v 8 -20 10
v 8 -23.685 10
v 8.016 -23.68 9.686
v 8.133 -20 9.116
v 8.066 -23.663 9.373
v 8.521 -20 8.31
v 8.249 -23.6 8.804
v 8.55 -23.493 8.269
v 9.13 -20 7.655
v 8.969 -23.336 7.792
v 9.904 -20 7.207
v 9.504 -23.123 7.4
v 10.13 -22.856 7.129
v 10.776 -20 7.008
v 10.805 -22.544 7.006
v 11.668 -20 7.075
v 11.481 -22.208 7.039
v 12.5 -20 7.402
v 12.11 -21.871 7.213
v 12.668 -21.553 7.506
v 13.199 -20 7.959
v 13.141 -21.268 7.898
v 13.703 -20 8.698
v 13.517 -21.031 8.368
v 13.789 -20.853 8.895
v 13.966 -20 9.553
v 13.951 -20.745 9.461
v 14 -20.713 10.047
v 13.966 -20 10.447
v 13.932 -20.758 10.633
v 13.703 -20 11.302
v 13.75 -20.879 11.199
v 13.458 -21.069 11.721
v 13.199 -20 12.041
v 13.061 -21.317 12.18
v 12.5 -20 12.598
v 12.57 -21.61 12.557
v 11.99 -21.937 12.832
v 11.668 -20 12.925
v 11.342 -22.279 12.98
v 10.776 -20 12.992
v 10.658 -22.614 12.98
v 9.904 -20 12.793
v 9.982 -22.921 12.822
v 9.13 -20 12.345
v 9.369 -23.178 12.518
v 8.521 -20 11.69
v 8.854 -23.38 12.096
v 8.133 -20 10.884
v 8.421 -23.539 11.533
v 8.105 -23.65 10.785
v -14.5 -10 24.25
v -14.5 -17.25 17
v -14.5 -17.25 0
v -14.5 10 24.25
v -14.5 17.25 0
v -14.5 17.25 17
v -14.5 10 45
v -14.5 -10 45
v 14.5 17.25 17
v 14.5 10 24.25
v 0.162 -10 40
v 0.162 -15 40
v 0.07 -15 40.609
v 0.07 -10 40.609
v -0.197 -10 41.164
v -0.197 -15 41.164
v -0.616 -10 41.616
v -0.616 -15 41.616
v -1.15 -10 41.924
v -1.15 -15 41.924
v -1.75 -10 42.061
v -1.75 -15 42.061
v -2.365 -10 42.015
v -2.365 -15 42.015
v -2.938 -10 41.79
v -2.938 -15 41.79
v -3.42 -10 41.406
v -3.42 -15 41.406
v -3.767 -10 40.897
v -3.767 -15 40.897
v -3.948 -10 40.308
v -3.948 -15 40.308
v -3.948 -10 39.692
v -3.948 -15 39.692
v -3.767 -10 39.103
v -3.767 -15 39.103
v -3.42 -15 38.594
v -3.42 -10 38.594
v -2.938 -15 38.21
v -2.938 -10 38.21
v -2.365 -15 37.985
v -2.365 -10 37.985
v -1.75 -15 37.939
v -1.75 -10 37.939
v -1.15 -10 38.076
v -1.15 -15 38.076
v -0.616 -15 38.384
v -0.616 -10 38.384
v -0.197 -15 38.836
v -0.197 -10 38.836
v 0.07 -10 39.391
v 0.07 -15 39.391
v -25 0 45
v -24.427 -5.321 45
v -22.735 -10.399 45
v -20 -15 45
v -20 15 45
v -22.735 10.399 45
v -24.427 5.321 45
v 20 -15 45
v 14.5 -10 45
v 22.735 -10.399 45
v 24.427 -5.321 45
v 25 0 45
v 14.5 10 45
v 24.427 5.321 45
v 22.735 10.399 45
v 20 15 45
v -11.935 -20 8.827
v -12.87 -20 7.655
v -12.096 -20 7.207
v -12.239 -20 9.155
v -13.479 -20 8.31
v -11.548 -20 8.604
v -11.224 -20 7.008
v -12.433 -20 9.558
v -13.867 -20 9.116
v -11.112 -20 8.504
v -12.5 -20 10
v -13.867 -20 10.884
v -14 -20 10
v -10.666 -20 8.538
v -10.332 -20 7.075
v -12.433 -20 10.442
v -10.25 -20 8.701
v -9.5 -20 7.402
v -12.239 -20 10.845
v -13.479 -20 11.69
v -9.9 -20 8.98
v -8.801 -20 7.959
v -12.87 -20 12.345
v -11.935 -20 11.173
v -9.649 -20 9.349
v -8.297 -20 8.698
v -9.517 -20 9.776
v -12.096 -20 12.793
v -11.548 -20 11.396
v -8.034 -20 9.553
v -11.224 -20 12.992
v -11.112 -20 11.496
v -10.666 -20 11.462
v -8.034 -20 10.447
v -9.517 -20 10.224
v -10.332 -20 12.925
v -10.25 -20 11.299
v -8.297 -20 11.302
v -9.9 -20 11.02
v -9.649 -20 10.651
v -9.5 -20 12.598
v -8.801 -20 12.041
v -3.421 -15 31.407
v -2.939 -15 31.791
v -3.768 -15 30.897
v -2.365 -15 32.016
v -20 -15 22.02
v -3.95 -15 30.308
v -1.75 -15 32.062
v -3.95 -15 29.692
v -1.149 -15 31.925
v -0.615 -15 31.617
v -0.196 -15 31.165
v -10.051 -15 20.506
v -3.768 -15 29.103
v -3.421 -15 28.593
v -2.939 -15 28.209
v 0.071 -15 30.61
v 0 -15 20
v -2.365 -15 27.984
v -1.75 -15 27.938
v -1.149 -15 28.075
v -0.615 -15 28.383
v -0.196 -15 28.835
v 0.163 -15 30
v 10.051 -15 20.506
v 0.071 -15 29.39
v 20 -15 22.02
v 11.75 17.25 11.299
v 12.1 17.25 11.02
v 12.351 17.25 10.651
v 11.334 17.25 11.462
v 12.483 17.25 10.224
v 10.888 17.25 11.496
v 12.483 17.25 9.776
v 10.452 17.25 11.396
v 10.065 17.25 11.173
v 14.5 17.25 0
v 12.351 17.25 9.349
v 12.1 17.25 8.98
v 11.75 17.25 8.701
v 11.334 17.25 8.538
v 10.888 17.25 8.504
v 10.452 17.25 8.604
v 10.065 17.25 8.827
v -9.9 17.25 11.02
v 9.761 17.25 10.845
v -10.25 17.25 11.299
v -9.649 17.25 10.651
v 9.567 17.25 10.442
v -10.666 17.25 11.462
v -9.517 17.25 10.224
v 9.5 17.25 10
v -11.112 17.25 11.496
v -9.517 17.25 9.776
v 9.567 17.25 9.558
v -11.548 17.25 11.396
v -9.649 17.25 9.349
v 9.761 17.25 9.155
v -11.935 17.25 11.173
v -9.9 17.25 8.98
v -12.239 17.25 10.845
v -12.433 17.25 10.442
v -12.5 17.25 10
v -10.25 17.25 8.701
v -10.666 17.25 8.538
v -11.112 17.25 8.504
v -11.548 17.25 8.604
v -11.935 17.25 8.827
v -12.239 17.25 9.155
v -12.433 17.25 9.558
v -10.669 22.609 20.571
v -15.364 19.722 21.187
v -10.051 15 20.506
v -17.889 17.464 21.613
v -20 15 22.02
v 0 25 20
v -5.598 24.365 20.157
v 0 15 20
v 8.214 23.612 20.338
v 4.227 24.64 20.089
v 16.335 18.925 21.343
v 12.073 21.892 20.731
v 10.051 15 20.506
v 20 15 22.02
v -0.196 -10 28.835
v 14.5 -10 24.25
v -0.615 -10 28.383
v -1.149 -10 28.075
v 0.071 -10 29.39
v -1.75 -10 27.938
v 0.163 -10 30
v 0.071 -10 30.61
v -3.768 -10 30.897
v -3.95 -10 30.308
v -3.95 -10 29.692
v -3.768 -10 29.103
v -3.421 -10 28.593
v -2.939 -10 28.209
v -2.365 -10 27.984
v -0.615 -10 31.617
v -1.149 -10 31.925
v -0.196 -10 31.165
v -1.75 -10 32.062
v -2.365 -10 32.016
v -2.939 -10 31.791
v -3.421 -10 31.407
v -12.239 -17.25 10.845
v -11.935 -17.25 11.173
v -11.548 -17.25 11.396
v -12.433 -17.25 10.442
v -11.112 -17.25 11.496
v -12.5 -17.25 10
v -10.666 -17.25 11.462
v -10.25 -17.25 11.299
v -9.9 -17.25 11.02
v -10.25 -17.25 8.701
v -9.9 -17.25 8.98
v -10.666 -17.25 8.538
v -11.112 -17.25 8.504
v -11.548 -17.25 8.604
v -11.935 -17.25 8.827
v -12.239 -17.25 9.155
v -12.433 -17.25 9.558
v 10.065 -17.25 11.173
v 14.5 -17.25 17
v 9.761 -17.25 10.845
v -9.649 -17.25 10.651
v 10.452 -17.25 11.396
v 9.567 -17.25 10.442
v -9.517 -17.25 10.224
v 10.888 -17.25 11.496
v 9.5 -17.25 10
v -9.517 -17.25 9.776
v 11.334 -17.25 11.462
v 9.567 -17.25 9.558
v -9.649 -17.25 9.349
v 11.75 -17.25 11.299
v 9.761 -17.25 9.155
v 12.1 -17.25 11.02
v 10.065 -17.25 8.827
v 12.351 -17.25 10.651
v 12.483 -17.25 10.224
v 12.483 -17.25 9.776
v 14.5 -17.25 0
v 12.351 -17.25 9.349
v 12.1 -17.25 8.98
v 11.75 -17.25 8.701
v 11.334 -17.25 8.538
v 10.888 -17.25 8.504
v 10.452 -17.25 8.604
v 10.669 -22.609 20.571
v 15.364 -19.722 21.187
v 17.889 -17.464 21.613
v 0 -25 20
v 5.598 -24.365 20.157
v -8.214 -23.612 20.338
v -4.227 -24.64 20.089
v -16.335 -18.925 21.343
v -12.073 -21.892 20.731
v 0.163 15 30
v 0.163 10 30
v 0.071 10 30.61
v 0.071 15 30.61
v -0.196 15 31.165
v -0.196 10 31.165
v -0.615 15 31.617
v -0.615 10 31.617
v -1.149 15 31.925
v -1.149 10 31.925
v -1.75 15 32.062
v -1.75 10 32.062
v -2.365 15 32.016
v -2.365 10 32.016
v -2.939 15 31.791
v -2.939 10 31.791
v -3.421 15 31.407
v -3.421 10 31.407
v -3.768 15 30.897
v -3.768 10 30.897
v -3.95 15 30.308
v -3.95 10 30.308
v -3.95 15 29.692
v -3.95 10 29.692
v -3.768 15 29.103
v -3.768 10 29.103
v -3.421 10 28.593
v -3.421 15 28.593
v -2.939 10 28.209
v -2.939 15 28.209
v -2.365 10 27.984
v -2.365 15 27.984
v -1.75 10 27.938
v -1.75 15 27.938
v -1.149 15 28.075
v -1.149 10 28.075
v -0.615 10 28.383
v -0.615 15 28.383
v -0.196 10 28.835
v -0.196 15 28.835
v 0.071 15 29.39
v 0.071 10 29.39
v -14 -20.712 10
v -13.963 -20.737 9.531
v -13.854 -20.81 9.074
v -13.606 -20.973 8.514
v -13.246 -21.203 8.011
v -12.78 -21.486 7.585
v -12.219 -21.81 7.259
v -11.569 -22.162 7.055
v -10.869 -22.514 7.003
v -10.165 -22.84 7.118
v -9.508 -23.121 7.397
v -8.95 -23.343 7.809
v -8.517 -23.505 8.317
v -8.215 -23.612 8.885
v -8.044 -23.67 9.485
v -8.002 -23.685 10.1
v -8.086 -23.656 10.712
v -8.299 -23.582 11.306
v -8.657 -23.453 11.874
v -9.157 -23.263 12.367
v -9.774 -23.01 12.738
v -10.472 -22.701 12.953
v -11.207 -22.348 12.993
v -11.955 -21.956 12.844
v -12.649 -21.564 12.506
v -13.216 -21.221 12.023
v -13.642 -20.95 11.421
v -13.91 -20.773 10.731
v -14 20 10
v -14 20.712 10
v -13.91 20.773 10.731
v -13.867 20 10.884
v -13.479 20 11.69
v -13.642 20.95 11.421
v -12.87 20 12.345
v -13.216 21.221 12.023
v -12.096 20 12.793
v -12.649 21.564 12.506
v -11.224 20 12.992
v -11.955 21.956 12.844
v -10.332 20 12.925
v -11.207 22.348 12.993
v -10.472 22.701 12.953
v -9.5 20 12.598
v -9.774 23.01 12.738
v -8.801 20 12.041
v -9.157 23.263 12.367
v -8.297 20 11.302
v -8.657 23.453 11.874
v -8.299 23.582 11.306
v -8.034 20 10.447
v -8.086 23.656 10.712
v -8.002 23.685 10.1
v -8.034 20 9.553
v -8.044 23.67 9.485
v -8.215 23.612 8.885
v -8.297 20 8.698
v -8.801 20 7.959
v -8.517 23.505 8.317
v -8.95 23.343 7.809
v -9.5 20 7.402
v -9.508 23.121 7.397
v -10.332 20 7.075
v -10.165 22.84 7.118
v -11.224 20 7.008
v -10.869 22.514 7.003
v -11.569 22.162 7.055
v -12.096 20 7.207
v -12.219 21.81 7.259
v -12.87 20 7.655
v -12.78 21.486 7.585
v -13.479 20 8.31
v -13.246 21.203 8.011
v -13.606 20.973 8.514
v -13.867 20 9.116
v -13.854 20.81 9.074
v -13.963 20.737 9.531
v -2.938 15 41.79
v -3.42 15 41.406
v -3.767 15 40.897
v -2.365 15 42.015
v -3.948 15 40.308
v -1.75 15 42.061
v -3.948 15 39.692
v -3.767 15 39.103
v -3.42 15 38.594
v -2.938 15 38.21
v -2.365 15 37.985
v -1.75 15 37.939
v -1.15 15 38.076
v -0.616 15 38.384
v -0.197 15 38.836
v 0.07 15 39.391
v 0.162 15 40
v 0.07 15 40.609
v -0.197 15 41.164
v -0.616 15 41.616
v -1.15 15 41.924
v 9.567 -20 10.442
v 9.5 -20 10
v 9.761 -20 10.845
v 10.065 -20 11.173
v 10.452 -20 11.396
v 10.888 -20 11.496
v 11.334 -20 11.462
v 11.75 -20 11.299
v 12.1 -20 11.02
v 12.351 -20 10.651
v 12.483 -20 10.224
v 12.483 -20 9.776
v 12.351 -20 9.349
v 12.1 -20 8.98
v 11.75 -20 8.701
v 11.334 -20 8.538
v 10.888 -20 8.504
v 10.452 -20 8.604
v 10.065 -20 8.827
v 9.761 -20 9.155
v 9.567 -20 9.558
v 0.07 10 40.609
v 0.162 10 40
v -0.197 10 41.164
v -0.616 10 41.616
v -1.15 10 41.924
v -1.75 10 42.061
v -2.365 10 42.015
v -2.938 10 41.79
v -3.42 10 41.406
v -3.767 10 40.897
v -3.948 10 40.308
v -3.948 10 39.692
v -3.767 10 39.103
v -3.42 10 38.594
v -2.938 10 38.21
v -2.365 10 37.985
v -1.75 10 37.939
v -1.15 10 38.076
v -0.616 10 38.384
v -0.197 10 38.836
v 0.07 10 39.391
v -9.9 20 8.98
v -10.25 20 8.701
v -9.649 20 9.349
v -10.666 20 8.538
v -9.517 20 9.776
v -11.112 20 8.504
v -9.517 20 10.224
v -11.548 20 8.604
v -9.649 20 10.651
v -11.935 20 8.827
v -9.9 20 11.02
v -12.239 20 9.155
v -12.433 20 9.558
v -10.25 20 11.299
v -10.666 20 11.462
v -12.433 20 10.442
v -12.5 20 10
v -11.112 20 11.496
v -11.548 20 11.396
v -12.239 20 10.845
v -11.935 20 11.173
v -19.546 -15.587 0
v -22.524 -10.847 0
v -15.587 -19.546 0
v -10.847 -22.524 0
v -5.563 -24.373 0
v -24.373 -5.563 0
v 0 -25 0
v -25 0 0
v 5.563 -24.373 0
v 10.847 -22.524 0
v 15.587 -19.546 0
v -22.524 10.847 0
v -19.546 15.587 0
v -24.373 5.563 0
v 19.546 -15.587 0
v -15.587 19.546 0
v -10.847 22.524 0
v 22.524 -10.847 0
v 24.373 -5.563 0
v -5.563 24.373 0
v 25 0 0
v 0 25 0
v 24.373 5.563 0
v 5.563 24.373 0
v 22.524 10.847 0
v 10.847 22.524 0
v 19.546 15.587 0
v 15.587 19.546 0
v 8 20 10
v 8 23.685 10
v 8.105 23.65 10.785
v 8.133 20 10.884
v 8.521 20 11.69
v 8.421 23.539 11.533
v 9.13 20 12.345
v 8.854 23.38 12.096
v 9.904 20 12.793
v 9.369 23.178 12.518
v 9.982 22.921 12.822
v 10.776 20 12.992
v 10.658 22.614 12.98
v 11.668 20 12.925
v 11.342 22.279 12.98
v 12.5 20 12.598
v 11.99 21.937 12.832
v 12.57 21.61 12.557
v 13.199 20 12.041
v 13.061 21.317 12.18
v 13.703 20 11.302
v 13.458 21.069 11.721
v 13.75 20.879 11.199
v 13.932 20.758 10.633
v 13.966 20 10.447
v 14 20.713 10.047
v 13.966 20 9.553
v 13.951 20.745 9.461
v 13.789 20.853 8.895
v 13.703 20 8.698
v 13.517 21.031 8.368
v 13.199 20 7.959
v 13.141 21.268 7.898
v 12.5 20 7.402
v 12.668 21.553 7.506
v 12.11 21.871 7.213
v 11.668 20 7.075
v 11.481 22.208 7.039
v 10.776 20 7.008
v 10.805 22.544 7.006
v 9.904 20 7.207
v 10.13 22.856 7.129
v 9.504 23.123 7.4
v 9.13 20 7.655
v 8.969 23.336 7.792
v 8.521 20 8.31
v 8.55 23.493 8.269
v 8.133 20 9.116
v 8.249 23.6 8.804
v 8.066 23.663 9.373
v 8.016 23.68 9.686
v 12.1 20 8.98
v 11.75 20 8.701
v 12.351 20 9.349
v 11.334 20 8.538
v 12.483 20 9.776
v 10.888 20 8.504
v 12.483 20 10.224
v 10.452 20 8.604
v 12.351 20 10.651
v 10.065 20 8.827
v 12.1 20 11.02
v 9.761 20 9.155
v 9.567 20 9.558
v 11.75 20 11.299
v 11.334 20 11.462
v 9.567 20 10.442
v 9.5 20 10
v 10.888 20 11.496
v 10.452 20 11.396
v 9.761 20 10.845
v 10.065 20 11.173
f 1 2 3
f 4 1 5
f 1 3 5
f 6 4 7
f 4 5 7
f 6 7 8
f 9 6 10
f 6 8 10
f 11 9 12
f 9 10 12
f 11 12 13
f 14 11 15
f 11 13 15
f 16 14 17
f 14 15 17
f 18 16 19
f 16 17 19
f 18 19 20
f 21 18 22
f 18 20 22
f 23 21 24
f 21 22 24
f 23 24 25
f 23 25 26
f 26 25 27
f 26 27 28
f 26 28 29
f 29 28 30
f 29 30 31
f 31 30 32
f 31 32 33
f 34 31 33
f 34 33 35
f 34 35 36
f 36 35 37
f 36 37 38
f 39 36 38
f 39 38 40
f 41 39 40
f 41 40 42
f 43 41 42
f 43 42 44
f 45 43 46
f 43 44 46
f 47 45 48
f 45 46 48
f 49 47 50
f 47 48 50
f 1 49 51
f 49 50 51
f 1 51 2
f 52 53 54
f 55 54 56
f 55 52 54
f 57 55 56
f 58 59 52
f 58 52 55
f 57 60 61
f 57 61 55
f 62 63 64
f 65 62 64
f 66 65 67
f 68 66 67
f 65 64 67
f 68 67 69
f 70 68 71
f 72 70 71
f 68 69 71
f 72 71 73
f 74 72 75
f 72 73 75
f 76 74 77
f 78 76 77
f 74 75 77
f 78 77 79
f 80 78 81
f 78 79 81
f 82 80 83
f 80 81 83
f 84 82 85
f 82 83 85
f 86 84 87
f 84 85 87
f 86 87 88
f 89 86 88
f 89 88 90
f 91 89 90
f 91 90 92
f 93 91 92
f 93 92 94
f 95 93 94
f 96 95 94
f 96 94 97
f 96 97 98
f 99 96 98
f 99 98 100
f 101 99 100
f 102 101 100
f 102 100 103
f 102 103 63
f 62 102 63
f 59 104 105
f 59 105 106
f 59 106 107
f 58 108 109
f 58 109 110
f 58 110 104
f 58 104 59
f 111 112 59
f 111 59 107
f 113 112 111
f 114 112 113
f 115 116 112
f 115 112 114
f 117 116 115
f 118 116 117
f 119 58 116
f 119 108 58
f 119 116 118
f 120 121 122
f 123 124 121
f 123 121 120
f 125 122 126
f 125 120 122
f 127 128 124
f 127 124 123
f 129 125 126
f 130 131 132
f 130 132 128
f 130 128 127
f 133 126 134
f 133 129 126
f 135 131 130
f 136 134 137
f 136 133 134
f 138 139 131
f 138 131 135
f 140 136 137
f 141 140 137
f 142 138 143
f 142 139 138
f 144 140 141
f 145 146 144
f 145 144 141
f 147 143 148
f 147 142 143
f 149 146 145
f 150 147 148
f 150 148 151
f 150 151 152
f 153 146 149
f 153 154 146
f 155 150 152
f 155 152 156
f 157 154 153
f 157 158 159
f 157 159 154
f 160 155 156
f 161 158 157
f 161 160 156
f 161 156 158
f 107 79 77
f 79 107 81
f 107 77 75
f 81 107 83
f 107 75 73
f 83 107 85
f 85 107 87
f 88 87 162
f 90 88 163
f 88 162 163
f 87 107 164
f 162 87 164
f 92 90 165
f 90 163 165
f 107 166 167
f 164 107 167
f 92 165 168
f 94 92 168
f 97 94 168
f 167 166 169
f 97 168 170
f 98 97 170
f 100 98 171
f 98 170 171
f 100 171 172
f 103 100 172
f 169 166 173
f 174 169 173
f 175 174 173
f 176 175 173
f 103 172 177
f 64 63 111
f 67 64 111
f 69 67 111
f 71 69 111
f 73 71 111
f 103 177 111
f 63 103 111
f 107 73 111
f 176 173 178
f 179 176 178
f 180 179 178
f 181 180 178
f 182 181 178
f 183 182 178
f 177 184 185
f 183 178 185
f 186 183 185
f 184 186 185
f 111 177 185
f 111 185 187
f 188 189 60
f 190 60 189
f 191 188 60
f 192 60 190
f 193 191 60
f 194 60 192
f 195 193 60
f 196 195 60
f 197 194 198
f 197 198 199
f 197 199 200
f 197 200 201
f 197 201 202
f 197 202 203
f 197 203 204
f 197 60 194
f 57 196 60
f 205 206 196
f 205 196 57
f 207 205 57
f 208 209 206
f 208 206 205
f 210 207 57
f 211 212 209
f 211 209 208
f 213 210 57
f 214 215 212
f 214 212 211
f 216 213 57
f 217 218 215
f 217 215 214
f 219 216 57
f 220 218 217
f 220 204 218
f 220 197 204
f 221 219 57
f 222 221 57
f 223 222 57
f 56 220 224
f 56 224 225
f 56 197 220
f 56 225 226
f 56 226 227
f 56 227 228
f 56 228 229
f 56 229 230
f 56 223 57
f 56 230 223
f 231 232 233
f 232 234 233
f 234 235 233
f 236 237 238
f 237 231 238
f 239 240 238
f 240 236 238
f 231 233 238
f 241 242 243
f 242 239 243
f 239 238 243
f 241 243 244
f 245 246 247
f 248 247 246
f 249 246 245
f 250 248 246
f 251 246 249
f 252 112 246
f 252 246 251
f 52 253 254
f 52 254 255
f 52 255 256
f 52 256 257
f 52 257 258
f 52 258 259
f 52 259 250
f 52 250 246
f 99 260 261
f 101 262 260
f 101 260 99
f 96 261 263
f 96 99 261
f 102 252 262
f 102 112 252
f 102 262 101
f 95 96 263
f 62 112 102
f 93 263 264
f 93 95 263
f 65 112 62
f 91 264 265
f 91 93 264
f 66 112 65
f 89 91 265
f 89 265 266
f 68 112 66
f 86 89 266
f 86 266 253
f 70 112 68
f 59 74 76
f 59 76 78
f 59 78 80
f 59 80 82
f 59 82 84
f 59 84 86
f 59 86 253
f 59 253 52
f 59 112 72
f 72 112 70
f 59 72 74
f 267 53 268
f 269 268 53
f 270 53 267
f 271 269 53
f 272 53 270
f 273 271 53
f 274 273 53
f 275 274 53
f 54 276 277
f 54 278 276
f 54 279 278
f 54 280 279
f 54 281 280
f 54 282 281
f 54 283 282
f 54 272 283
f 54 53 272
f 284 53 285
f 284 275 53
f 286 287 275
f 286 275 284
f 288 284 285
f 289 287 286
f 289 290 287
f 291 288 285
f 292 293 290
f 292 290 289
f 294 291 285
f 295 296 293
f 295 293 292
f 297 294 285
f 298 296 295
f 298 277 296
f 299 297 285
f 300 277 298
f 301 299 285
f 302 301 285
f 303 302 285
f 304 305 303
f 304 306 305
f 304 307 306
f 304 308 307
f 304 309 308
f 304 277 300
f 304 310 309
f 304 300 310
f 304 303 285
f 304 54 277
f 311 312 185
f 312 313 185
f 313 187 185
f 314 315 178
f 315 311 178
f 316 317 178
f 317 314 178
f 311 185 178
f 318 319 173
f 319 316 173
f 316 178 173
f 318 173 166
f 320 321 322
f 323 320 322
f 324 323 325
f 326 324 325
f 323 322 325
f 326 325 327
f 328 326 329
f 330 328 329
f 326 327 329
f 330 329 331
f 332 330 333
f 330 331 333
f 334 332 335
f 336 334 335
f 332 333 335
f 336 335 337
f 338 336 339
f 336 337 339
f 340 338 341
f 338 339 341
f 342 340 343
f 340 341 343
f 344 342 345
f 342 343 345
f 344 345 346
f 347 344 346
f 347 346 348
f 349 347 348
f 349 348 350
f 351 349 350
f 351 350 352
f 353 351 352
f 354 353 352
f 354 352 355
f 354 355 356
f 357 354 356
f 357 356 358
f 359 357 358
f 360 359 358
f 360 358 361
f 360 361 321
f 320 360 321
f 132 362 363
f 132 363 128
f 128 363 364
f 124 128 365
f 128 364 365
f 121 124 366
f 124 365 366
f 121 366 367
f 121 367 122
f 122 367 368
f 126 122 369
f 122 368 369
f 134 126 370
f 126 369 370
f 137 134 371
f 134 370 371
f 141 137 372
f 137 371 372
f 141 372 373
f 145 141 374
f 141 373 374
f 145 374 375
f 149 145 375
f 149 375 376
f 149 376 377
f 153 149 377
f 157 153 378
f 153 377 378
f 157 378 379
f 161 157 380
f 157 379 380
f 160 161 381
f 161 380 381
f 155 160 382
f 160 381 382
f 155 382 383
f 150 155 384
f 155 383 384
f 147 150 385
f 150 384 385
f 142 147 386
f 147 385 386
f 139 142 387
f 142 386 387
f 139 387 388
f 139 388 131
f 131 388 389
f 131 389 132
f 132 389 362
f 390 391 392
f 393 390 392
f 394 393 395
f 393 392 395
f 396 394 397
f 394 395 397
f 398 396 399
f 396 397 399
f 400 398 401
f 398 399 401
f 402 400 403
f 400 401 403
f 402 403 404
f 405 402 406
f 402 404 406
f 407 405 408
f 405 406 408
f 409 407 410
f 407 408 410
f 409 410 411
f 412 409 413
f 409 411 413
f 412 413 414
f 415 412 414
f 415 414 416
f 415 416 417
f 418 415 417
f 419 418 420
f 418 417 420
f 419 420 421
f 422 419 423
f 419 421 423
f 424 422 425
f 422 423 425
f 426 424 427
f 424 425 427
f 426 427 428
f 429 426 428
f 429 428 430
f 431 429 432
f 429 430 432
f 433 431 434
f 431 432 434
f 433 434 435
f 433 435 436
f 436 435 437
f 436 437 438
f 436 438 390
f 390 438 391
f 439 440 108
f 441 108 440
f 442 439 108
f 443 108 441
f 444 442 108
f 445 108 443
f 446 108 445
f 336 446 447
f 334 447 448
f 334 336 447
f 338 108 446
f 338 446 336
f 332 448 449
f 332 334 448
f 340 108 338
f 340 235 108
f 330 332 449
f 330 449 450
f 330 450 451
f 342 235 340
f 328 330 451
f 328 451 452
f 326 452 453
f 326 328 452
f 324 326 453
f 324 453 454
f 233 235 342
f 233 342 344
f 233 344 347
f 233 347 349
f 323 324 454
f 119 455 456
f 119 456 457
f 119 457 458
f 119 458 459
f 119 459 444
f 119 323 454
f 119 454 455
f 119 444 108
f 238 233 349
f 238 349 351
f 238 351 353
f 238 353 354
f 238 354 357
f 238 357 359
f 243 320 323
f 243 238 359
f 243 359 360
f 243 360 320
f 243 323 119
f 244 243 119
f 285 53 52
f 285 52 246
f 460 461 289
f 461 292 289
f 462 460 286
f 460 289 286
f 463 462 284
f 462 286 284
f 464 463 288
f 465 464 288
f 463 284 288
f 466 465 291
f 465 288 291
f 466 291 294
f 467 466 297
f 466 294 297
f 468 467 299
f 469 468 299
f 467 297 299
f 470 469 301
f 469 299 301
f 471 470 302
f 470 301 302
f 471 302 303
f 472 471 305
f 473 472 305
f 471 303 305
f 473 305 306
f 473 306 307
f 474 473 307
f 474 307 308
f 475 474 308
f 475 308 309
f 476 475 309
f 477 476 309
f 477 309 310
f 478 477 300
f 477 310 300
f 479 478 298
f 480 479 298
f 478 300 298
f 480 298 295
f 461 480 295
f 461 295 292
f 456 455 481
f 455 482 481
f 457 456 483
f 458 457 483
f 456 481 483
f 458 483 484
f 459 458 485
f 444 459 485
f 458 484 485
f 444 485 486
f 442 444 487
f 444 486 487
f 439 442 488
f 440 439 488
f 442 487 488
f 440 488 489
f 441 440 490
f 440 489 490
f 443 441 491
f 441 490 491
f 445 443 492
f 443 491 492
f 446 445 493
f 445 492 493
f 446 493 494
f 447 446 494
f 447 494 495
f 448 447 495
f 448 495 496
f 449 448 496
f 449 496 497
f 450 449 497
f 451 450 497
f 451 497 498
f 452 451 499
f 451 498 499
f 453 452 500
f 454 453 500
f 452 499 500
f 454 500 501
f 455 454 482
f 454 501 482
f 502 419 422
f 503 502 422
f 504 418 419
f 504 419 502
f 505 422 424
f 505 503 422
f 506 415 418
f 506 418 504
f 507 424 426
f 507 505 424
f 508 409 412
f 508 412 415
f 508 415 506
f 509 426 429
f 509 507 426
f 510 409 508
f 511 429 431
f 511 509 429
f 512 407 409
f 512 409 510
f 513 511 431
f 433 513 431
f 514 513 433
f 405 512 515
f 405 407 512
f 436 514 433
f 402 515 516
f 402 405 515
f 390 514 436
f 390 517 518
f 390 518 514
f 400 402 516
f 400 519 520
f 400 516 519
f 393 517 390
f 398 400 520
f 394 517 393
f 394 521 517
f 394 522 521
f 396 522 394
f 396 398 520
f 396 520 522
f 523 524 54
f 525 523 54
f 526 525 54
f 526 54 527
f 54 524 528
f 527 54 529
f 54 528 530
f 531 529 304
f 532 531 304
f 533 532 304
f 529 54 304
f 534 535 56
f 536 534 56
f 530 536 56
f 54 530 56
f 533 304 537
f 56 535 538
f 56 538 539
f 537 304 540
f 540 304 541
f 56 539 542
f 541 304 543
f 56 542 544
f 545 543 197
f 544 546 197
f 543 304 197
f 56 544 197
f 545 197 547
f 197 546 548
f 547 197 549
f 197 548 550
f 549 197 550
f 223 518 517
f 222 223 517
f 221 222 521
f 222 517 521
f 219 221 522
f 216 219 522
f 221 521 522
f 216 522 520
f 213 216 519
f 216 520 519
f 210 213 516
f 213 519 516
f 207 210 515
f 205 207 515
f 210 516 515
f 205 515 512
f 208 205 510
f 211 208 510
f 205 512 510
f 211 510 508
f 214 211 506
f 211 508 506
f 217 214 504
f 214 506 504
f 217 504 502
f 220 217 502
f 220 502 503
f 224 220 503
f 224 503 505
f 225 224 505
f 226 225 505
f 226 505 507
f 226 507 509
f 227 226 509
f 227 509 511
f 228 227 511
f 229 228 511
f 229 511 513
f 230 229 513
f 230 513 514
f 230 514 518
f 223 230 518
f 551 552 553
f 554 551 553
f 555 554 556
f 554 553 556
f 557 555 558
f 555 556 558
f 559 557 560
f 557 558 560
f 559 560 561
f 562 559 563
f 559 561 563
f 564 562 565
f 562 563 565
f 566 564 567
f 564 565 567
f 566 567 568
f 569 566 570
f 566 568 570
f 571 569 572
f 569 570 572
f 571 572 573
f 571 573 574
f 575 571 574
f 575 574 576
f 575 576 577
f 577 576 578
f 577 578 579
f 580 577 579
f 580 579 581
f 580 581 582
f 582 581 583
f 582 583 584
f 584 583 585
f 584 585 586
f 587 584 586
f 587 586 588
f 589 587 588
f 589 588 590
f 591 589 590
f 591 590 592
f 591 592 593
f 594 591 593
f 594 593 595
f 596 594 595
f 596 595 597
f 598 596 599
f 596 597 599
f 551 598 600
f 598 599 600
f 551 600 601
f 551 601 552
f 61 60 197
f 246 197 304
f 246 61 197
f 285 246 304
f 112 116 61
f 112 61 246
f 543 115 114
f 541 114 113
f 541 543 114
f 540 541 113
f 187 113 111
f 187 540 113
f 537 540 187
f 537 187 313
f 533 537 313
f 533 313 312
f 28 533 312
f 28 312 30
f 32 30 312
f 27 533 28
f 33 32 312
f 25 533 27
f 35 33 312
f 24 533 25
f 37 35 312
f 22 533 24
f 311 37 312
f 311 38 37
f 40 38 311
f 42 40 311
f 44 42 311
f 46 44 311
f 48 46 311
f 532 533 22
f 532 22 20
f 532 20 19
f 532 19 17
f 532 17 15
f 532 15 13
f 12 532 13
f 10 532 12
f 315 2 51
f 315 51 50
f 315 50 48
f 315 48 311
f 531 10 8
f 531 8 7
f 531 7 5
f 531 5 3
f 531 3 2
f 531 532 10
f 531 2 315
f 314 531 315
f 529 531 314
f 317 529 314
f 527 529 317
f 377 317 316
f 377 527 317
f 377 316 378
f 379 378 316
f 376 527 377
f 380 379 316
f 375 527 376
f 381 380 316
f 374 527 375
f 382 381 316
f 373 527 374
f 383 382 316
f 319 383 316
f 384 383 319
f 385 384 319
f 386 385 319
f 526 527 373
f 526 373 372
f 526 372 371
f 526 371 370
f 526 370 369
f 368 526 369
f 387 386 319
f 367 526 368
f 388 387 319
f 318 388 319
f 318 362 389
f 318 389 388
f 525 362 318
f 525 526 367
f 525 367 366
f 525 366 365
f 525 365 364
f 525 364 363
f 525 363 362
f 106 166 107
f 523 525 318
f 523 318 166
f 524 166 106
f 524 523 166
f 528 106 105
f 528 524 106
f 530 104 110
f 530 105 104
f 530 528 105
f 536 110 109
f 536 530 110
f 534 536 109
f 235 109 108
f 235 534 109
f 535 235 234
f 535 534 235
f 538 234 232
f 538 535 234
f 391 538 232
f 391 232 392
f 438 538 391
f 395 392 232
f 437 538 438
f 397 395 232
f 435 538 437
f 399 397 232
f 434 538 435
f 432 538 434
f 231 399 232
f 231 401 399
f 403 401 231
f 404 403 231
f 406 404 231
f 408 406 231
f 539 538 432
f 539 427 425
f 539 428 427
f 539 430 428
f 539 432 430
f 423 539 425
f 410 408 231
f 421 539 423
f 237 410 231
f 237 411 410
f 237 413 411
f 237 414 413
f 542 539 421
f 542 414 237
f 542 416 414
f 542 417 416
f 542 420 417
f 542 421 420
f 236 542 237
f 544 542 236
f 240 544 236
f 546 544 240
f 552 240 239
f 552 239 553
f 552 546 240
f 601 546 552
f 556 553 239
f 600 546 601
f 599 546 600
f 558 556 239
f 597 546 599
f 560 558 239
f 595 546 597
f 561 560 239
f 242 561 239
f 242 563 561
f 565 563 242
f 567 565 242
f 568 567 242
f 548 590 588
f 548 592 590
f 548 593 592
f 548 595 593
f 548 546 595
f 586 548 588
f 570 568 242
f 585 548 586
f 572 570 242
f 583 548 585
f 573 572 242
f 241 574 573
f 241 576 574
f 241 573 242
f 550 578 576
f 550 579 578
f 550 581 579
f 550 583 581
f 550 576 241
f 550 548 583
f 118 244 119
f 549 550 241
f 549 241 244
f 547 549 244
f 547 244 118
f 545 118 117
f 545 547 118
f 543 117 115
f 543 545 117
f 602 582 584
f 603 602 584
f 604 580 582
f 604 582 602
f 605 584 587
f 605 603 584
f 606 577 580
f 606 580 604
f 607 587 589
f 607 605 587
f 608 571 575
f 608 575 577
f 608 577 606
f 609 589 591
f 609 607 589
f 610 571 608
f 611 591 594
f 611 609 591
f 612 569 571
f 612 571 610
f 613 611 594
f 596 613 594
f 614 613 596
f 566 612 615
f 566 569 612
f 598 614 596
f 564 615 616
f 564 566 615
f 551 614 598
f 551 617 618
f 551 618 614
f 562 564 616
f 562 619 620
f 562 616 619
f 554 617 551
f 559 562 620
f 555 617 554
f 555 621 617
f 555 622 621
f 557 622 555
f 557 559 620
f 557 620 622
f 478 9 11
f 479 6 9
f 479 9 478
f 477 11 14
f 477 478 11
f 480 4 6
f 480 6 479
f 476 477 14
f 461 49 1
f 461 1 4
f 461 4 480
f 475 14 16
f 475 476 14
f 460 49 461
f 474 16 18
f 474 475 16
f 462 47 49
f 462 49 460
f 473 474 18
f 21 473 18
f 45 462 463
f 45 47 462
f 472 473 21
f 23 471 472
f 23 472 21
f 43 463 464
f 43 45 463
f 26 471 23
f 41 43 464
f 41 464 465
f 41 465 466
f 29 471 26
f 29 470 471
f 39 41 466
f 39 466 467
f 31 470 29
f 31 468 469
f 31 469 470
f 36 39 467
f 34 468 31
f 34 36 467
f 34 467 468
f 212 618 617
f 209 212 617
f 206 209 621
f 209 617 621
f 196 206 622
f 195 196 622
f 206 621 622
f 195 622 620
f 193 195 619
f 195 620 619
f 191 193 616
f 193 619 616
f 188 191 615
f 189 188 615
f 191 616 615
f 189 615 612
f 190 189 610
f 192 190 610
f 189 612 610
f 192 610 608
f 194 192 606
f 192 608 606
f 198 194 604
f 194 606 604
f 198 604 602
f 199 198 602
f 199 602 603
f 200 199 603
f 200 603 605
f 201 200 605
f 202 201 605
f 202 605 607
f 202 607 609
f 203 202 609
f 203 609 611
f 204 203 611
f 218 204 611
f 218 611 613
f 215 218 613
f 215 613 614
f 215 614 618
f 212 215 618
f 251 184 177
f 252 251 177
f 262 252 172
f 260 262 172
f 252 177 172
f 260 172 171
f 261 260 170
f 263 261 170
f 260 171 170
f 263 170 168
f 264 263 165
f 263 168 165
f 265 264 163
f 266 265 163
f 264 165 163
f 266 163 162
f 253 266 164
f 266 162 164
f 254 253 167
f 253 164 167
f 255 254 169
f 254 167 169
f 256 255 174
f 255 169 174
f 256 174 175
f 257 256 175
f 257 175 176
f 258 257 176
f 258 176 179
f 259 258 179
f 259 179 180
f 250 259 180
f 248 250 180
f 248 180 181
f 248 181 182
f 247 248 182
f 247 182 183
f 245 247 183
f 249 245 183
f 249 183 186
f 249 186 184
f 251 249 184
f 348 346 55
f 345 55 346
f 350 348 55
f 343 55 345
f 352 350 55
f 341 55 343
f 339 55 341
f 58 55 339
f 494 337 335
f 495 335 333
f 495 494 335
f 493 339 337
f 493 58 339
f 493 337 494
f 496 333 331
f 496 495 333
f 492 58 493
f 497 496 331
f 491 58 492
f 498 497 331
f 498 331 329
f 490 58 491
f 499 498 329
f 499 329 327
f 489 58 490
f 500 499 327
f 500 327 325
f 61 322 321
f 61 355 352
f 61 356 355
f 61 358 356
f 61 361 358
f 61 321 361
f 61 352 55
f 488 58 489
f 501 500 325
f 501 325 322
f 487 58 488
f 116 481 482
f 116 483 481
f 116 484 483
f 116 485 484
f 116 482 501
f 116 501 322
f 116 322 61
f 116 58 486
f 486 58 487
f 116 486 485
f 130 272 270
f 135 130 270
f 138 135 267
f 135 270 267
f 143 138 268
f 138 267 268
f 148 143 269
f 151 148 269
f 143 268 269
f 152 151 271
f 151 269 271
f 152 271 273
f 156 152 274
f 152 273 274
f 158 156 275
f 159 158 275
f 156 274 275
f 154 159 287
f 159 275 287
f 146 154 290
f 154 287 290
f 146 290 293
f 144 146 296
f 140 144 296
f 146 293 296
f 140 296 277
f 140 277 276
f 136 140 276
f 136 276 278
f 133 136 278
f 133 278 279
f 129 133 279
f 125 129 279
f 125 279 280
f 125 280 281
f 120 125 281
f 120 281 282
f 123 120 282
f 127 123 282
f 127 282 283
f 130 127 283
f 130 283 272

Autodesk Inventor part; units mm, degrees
ref_plane "YZ Plane" through (0, 0, 0) normal (1, 0, 0) x (0, 1, 0)
ref_plane "XY Plane" through (0, 0, 0) normal (0, 0, 1) x (1, 0, 0)
sketch "Sketch1" plane through (0, 0, 0) normal (0, 0, 1) x (1, 0, 0)
  circle A0 centre (0, 0) radius 25
  line L0 (-14.5, 17.25) -> (14.5, 17.25)
  line L1 (14.5, 17.25) -> (14.5, -17.25)
  line L2 (14.5, -17.25) -> (-14.5, -17.25)
  line L3 (-14.5, -17.25) -> (-14.5, 17.25)
  dimension "d0" = 50
  dimension "d1" = 29
  dimension "d2" = 34.5
  dimension "d3" = 14.5
  dimension "d4" = 17.25
extrude "Extrusion1" add sketch "Sketch1" along normal blind 30 contours A0 | L0 L1 L2 L3
sketch "Sketch2" plane through (0, 0, 30) normal (0, 0, 1) x (1, 0, 0)
  circle A0 centre (0, 0) radius 25 projected
  line L0 (-20, 15) -> (20, 15)
  line L1 (-20, -15) -> (20, -15)
  dimension "d14" = 30
  dimension "d15" = 15
extrude "Extrusion2" add sketch "Sketch2" along normal blind 15 contours A0 L1 L0
sketch "Sketch4" plane through (-20, 15, 30) normal (0, 1, 0) x (1, 0, 0)
  circle A0 centre (20, -90) radius 100
  line L0 (40, -15) -> (0, -15) projected
  line L1 (-5, 30) -> (-5, -15) projected
  point P0 (20, 30)
  dimension "d16" = 75
  dimension "d17" = 25
  dimension "d18" = 200
extrude "Extrusion4" cut sketch "Sketch4" along normal blind 10
mirror "Mirror1" about plane through (0, 0, 0) normal (0, 1, 0) of "Extrusion4"
sketch "Sketch5" plane through (0, 0, 0) normal (0, 0, -1) x (-1, 0, 0)
  line L0 (14.5, -17.25) -> (-14.5, -17.25)
  line L1 (-14.5, -17.25) -> (-14.5, 17.25)
  line L2 (-14.5, 17.25) -> (14.5, 17.25)
  line L3 (14.5, 17.25) -> (14.5, -17.25)
  point P0 (0, 0)
  dimension "d21" = 34.5
  dimension "d22" = 29
  dimension "d23" = 17.25
  dimension "d24" = 14.5
extrude "Extrusion5" cut sketch "Sketch5" against normal blind 17
ref_plane "Work Plane1" through (0, 25, 0) normal (0, 1, 0) x (-1, 0, 0)
sketch "Sketch6" plane through (0, 25, 0) normal (0, 1, 0) x (-1, 0, 0)
  circle A0 centre (-11, 10) radius 1.5
  circle A1 centre (11, 10) radius 1.5
  line L0 (25, 0) -> (-25, 0) projected
  line L1 (-14.5, 0) -> (-14.5, 17) projected
  point P0 (0, 0)
  point P1 (-14.5, 16.0568)
  dimension "d28" = 3
  dimension "d29" = 3
  dimension "d30" = 10
  dimension "d31" = 10
  dimension "d32" = 22
  dimension "d33" = 3.5
extrude "Extrusion6" cut sketch "Sketch6" against normal blind 50
sketch "Sketch7" plane through (0, 25, 0) normal (0, 1, 0) x (-1, 0, 0)
  circle A0 centre (-11, 10) radius 1.5 projected
  circle A1 centre (-11, 10) radius 3
  circle A2 centre (11, 10) radius 1.5 projected
  circle A3 centre (11, 10) radius 3
  point P0 (0, 0)
  dimension "d36" = 6
  dimension "d37" = 6
extrude "Extrusion7" cut sketch "Sketch7" against normal blind 5 contours A0 | A1 | A2 | A3
mirror "Mirror2" about plane through (0, 0, 0) normal (0, 1, 0) of "Extrusion7"
sketch "Sketch9" plane through (0, 0, 45) normal (0, 0, 1) x (1, 0, 0)
  line L0 (-14.5, 10) -> (14.5, 10)
  line L1 (14.5, 10) -> (14.5, -10)
  line L2 (14.5, -10) -> (-14.5, -10)
  line L3 (-14.5, -10) -> (-14.5, 10)
  line L4 (20, 15) -> (-20, 15) projected
  line L5 (-20, -15) -> (20, -15) projected
  point P0 (0, 0)
  dimension "d57" = 29
  dimension "d58" = 14.5
  dimension "d64" = 5
  dimension "d65" = 5
extrude "Extrusion9" cut sketch "Sketch9" against normal blind 40
chamfer "Chamfer1" distance 7.25 angle 45 2 edges at (0, 10, 17) (0, -10, 17)
sketch "Sketch10" plane through (-20, -15, 45) normal (0, -1, 0) x (1, 0, 0)
  circle A0 centre (18.0952, -5) radius 2.0666
  circle A1 centre (18.0952, -15) radius 2.0679
  line L0 (0, 0) -> (40, 0) projected
  line L1 (7.0094, -25) -> (36.1661, -25)
  arc A2 (0, -22.9796) -> (40, -22.9796) centre (20, 75) ccw projected
  point P0 (20, -45)
  point P1 (18.0952, -25)
  point P2 (32.5952, -28.9432)
  dimension "d66" = 15
  dimension "d67" = 5
extrude "Extrusion10" cut sketch "Sketch10" against normal blind 40
equation "\"d3\" = 0.5 * d1"
equation "\"d4\" = 0.5 * d2"
equation "\"d15\" = 0.5 * d14"
equation "\"d23\" = 0.5 * d21"
equation "\"d24\" = 0.5 * d22"
equation "\"d58\" = 0.5 * d57"
equation "\"d65\" = d64"
properties part number "RL_spider_leg_mount"
